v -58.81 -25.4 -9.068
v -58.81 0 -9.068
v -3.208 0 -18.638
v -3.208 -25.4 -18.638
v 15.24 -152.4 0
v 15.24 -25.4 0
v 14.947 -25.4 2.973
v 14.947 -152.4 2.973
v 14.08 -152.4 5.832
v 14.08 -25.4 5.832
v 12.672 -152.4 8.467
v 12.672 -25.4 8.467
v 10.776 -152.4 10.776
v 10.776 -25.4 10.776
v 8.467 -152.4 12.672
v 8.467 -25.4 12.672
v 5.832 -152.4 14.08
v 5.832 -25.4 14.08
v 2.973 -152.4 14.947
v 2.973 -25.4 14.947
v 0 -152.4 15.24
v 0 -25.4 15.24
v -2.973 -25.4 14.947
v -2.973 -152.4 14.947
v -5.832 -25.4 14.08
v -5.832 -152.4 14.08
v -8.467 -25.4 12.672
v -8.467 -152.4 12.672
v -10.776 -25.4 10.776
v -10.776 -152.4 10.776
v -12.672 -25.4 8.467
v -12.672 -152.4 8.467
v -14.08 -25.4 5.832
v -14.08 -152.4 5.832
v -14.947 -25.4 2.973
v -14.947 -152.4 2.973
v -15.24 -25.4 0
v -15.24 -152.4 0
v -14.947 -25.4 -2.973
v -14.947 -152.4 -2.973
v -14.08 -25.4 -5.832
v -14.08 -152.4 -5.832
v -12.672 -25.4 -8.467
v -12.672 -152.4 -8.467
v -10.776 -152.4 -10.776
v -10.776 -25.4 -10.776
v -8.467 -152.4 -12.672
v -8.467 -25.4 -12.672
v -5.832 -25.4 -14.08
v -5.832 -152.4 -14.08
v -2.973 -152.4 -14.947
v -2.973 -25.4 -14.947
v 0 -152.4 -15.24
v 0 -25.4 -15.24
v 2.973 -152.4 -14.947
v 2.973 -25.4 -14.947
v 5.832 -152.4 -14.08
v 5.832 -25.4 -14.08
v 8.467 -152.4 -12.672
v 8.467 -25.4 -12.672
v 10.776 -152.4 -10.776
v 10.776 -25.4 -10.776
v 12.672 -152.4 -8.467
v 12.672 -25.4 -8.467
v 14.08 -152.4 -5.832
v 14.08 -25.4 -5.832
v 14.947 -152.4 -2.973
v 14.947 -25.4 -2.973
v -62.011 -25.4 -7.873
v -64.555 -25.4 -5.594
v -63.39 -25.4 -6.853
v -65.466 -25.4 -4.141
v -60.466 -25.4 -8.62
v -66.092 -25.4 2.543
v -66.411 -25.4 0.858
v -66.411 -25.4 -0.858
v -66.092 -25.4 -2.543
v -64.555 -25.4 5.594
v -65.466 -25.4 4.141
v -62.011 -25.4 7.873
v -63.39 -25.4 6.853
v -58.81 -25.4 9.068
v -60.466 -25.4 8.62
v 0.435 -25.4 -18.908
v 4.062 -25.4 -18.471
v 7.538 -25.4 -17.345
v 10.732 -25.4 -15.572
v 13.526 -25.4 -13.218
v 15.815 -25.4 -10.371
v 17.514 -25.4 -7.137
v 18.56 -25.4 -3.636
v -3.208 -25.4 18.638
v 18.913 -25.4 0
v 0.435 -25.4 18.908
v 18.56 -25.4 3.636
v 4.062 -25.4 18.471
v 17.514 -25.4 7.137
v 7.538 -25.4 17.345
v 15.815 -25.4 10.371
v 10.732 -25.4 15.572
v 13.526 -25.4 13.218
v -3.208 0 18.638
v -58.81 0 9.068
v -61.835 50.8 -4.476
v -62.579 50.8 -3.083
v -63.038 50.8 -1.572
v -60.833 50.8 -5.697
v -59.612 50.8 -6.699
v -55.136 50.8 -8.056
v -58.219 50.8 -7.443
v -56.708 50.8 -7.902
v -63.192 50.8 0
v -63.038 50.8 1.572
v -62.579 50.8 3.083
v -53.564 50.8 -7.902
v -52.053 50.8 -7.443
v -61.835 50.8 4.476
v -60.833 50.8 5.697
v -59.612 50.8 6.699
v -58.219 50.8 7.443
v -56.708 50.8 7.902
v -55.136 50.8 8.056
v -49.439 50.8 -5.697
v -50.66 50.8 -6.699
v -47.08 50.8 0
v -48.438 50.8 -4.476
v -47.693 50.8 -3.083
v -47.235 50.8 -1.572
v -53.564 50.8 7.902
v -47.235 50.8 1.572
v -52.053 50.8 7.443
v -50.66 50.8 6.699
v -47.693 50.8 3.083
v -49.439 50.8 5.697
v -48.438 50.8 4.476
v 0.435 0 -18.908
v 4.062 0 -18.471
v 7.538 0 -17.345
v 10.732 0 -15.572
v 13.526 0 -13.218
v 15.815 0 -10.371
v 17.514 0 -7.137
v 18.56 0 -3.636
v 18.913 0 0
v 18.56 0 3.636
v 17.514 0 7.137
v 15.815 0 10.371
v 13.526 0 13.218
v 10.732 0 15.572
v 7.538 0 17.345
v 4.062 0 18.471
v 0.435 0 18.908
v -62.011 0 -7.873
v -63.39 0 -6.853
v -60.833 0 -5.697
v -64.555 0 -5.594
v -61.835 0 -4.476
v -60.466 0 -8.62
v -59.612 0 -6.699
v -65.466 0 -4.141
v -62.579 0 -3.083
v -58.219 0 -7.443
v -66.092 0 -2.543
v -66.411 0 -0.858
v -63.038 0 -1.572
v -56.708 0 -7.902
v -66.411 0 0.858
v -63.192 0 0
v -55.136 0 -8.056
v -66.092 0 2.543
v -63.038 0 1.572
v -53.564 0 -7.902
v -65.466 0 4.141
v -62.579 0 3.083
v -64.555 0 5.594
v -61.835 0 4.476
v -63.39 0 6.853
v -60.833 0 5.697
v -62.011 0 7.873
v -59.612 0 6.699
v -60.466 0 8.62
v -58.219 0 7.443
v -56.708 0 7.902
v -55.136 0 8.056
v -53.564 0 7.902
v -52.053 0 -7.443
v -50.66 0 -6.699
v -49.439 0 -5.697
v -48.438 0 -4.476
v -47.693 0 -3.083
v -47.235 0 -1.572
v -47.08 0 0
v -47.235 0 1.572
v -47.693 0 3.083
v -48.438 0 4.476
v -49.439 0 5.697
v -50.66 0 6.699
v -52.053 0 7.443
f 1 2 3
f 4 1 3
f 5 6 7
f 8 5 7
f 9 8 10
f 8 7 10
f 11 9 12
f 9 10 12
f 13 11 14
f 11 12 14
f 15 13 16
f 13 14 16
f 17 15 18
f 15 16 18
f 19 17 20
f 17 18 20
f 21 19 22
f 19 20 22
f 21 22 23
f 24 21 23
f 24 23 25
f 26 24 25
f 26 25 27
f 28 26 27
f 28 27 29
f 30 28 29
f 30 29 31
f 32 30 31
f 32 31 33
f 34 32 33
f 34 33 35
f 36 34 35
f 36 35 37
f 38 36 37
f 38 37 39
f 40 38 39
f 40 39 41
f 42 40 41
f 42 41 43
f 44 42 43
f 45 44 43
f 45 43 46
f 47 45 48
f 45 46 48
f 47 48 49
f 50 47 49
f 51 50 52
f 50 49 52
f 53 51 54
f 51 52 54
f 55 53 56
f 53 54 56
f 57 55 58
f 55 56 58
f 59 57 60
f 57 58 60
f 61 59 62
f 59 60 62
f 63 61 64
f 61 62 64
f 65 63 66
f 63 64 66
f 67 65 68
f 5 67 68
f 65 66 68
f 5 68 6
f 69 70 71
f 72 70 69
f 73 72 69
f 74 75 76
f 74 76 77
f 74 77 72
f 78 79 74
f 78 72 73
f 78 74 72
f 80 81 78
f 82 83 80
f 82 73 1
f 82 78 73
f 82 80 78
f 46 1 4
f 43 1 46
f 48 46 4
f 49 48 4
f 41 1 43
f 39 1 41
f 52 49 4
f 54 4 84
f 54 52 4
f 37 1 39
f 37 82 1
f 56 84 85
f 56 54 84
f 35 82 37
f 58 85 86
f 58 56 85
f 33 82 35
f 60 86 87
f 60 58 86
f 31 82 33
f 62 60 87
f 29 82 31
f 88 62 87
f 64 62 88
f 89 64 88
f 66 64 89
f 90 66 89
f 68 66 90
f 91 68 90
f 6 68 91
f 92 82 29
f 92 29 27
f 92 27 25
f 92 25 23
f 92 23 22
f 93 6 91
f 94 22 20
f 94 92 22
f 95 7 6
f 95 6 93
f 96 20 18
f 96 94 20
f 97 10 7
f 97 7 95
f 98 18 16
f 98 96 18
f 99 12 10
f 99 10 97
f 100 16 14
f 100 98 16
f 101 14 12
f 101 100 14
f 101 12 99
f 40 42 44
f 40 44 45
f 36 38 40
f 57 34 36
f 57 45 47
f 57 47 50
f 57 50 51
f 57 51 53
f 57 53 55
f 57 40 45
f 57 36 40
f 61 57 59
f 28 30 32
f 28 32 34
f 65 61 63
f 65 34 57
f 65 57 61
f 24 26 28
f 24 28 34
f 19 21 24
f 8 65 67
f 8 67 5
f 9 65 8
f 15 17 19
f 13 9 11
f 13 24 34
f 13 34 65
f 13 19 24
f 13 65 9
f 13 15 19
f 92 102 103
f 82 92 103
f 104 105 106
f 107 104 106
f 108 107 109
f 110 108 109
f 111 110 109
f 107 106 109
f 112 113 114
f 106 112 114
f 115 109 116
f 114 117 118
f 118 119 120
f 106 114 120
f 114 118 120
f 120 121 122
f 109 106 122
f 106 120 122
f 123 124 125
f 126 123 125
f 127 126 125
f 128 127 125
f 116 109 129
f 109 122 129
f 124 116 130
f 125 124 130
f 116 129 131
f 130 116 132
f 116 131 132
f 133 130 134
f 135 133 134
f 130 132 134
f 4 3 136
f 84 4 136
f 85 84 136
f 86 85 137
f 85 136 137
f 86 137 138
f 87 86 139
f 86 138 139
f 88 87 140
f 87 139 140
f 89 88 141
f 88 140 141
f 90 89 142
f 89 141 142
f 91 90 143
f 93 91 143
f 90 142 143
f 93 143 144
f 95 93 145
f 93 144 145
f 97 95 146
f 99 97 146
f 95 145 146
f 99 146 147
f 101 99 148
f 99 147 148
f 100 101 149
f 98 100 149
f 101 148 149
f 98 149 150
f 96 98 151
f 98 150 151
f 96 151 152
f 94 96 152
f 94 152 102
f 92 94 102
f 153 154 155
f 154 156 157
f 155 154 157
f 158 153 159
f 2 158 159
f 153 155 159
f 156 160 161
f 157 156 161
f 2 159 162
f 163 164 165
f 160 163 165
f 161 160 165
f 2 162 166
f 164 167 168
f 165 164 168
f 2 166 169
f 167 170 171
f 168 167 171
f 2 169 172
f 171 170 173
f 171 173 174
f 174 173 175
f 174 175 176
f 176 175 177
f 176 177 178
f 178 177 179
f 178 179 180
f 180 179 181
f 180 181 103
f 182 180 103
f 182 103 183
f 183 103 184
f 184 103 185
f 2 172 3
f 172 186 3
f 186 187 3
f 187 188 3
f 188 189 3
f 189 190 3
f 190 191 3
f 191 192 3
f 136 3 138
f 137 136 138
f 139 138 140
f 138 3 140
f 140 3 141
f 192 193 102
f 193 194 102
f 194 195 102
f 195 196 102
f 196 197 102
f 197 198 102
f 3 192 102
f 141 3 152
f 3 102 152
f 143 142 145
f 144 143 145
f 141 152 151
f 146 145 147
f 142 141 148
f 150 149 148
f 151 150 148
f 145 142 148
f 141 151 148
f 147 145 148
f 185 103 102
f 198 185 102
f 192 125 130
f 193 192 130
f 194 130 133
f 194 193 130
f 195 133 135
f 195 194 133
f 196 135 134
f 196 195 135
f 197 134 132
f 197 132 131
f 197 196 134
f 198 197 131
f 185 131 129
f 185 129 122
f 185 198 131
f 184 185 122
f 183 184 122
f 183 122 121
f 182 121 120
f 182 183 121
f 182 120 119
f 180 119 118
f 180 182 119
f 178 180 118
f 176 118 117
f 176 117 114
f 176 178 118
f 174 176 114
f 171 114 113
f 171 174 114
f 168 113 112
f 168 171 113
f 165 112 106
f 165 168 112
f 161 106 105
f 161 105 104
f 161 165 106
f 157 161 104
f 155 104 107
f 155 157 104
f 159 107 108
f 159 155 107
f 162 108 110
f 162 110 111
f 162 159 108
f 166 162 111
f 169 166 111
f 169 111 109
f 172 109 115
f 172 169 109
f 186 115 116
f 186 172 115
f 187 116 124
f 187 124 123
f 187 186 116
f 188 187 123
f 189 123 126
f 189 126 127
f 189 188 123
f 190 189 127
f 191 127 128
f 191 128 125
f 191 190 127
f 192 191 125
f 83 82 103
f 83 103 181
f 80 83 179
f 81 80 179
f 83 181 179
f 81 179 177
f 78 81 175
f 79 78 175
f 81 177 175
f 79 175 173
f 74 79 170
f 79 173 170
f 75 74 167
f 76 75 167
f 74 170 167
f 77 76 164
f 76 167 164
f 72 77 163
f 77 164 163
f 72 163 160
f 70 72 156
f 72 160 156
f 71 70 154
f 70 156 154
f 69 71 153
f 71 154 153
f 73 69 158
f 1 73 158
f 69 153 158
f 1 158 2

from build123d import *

# Parameters (mm, degrees)
F0_R     = 15.24
F1_DEPTH = 152.4
F3_DEPTH = 25.4
F4_R     = 8.05635
F5_DEPTH = 50.8


with BuildPart() as f1:
    # F0 (on Front) → F1 (new body)
    with BuildSketch(Plane.XZ):
        Circle(F0_R)
    extrude(amount=F1_DEPTH)

    # F2 (on Front) → F3 (join)
    with BuildSketch(Plane.XZ):
        with BuildLine():
            Line((-58.810396, -9.067713), (-3.208219, -18.63846))
            ThreePointArc((-3.208219, -18.63846), (18.912558, 0), (-3.208219, 18.63846))
            Line((-3.208219, 18.63846), (-58.810396, 9.067713))
            ThreePointArc((-58.810396, 9.067713), (-66.450643, 0), (-58.810396, -9.067713))
        make_face()
    extrude(amount=F3_DEPTH)

    # F4 (on Front) → F5 (join)
    with BuildSketch(Plane.XZ):
        with Locations((-55.136111, 0)):
            Circle(F4_R)
    extrude(amount=-F5_DEPTH)


solid = f1.part
